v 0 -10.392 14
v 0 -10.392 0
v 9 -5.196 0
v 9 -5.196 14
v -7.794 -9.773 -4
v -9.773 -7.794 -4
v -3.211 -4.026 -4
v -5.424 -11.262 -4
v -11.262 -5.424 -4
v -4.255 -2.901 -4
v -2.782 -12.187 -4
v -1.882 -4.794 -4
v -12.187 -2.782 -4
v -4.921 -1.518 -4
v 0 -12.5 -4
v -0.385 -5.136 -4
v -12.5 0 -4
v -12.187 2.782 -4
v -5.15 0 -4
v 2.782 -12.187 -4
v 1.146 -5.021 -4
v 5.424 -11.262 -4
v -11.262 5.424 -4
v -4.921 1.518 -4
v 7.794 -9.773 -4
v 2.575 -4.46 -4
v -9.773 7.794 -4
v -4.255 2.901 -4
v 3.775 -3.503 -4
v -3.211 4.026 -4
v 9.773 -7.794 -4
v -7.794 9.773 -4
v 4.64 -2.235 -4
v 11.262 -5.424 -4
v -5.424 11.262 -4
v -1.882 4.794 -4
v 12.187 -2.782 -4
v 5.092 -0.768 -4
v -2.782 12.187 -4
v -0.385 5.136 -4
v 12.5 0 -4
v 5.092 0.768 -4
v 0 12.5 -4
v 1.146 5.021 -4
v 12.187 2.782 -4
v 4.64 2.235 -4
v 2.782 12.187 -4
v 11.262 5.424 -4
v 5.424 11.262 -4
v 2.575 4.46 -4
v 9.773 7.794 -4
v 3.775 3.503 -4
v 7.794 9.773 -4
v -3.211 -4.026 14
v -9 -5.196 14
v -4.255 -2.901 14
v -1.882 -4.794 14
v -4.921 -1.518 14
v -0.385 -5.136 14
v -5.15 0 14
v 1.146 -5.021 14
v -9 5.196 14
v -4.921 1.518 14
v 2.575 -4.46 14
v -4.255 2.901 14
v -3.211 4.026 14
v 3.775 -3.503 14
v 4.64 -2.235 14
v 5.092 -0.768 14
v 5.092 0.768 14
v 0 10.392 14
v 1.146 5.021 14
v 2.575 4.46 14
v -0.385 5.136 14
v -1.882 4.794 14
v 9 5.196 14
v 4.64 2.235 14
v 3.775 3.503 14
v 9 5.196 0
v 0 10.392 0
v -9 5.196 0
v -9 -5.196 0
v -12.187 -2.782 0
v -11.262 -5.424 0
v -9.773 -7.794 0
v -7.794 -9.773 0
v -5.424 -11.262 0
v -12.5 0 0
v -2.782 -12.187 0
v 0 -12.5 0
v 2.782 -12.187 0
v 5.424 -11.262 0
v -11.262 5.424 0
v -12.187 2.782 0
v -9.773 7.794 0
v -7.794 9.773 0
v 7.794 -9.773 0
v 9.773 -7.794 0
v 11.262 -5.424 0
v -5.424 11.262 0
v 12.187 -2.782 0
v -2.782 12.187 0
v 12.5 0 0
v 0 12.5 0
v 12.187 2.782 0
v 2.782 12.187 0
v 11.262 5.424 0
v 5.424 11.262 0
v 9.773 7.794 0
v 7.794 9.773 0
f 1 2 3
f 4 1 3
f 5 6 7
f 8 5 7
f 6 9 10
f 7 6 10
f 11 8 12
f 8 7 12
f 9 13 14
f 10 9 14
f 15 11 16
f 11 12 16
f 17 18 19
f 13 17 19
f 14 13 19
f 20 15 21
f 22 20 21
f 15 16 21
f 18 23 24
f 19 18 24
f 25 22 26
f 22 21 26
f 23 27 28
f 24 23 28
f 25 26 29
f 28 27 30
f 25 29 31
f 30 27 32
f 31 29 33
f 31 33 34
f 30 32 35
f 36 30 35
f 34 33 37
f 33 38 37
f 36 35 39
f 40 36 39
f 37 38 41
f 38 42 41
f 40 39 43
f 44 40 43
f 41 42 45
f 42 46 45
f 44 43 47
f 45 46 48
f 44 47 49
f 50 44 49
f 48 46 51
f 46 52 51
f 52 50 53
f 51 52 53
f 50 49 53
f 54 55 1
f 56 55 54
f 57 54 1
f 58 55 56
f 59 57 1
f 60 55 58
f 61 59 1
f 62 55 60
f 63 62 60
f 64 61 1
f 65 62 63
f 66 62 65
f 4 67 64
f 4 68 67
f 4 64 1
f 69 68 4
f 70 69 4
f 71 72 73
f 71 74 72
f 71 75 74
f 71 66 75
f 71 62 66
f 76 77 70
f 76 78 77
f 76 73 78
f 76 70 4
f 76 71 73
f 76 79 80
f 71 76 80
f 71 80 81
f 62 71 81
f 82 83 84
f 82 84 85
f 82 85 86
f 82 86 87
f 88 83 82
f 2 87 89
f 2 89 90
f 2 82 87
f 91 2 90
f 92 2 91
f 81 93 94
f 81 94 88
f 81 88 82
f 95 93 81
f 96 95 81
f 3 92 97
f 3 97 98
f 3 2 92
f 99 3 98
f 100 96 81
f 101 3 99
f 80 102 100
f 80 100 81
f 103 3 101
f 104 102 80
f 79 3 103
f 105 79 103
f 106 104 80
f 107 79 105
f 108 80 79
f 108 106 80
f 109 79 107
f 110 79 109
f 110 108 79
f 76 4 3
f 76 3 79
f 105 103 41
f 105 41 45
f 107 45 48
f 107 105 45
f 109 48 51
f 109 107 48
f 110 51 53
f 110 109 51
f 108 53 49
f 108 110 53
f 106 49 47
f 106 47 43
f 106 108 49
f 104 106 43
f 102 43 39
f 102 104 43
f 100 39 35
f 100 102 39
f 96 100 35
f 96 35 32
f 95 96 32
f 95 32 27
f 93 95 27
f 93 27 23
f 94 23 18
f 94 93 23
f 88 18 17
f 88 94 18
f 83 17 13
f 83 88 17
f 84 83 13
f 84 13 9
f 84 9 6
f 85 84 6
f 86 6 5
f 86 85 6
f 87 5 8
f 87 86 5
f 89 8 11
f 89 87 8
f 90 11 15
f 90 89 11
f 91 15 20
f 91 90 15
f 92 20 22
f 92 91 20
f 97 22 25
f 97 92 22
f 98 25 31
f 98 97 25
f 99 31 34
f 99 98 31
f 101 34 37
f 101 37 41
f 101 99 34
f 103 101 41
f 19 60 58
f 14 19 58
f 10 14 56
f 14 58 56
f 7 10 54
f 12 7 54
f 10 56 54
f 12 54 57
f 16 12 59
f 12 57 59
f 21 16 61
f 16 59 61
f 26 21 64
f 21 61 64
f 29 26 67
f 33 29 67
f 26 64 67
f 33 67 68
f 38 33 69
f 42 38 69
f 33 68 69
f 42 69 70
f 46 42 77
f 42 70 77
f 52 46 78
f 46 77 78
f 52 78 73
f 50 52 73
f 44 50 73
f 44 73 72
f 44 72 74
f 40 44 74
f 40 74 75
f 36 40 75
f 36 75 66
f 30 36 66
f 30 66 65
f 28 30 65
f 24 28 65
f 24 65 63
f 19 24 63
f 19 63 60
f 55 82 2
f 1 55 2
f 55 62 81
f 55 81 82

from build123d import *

# Parameters (mm, degrees)
F0_R     = 12.5
F1_DEPTH = 4
F3_DEPTH = 14
F5_D     = 10.3


with BuildPart() as f1:
    # F0 (on Top) → F1 (new body)
    with BuildSketch(Plane.XY):
        Circle(F0_R)
    extrude(amount=-F1_DEPTH)

    # F2 (on face) → F3 (join)
    with BuildSketch(Plane.XY):
        Polygon((9, -5.1961524227), (9, 5.1961524227), (0, 10.3923048454), (-9, 5.1961524227), (-9, -5.1961524227), (0, -10.3923048454), align=None)
    extrude(amount=F3_DEPTH)

    # F5 (through all)
    with Locations(Plane(origin=(0, 0, -4), x_dir=(1, 0, 0), z_dir=(0, 0, -1))):
        with Locations((0, 0)):
            Hole(F5_D / 2)


solid = f1.part
